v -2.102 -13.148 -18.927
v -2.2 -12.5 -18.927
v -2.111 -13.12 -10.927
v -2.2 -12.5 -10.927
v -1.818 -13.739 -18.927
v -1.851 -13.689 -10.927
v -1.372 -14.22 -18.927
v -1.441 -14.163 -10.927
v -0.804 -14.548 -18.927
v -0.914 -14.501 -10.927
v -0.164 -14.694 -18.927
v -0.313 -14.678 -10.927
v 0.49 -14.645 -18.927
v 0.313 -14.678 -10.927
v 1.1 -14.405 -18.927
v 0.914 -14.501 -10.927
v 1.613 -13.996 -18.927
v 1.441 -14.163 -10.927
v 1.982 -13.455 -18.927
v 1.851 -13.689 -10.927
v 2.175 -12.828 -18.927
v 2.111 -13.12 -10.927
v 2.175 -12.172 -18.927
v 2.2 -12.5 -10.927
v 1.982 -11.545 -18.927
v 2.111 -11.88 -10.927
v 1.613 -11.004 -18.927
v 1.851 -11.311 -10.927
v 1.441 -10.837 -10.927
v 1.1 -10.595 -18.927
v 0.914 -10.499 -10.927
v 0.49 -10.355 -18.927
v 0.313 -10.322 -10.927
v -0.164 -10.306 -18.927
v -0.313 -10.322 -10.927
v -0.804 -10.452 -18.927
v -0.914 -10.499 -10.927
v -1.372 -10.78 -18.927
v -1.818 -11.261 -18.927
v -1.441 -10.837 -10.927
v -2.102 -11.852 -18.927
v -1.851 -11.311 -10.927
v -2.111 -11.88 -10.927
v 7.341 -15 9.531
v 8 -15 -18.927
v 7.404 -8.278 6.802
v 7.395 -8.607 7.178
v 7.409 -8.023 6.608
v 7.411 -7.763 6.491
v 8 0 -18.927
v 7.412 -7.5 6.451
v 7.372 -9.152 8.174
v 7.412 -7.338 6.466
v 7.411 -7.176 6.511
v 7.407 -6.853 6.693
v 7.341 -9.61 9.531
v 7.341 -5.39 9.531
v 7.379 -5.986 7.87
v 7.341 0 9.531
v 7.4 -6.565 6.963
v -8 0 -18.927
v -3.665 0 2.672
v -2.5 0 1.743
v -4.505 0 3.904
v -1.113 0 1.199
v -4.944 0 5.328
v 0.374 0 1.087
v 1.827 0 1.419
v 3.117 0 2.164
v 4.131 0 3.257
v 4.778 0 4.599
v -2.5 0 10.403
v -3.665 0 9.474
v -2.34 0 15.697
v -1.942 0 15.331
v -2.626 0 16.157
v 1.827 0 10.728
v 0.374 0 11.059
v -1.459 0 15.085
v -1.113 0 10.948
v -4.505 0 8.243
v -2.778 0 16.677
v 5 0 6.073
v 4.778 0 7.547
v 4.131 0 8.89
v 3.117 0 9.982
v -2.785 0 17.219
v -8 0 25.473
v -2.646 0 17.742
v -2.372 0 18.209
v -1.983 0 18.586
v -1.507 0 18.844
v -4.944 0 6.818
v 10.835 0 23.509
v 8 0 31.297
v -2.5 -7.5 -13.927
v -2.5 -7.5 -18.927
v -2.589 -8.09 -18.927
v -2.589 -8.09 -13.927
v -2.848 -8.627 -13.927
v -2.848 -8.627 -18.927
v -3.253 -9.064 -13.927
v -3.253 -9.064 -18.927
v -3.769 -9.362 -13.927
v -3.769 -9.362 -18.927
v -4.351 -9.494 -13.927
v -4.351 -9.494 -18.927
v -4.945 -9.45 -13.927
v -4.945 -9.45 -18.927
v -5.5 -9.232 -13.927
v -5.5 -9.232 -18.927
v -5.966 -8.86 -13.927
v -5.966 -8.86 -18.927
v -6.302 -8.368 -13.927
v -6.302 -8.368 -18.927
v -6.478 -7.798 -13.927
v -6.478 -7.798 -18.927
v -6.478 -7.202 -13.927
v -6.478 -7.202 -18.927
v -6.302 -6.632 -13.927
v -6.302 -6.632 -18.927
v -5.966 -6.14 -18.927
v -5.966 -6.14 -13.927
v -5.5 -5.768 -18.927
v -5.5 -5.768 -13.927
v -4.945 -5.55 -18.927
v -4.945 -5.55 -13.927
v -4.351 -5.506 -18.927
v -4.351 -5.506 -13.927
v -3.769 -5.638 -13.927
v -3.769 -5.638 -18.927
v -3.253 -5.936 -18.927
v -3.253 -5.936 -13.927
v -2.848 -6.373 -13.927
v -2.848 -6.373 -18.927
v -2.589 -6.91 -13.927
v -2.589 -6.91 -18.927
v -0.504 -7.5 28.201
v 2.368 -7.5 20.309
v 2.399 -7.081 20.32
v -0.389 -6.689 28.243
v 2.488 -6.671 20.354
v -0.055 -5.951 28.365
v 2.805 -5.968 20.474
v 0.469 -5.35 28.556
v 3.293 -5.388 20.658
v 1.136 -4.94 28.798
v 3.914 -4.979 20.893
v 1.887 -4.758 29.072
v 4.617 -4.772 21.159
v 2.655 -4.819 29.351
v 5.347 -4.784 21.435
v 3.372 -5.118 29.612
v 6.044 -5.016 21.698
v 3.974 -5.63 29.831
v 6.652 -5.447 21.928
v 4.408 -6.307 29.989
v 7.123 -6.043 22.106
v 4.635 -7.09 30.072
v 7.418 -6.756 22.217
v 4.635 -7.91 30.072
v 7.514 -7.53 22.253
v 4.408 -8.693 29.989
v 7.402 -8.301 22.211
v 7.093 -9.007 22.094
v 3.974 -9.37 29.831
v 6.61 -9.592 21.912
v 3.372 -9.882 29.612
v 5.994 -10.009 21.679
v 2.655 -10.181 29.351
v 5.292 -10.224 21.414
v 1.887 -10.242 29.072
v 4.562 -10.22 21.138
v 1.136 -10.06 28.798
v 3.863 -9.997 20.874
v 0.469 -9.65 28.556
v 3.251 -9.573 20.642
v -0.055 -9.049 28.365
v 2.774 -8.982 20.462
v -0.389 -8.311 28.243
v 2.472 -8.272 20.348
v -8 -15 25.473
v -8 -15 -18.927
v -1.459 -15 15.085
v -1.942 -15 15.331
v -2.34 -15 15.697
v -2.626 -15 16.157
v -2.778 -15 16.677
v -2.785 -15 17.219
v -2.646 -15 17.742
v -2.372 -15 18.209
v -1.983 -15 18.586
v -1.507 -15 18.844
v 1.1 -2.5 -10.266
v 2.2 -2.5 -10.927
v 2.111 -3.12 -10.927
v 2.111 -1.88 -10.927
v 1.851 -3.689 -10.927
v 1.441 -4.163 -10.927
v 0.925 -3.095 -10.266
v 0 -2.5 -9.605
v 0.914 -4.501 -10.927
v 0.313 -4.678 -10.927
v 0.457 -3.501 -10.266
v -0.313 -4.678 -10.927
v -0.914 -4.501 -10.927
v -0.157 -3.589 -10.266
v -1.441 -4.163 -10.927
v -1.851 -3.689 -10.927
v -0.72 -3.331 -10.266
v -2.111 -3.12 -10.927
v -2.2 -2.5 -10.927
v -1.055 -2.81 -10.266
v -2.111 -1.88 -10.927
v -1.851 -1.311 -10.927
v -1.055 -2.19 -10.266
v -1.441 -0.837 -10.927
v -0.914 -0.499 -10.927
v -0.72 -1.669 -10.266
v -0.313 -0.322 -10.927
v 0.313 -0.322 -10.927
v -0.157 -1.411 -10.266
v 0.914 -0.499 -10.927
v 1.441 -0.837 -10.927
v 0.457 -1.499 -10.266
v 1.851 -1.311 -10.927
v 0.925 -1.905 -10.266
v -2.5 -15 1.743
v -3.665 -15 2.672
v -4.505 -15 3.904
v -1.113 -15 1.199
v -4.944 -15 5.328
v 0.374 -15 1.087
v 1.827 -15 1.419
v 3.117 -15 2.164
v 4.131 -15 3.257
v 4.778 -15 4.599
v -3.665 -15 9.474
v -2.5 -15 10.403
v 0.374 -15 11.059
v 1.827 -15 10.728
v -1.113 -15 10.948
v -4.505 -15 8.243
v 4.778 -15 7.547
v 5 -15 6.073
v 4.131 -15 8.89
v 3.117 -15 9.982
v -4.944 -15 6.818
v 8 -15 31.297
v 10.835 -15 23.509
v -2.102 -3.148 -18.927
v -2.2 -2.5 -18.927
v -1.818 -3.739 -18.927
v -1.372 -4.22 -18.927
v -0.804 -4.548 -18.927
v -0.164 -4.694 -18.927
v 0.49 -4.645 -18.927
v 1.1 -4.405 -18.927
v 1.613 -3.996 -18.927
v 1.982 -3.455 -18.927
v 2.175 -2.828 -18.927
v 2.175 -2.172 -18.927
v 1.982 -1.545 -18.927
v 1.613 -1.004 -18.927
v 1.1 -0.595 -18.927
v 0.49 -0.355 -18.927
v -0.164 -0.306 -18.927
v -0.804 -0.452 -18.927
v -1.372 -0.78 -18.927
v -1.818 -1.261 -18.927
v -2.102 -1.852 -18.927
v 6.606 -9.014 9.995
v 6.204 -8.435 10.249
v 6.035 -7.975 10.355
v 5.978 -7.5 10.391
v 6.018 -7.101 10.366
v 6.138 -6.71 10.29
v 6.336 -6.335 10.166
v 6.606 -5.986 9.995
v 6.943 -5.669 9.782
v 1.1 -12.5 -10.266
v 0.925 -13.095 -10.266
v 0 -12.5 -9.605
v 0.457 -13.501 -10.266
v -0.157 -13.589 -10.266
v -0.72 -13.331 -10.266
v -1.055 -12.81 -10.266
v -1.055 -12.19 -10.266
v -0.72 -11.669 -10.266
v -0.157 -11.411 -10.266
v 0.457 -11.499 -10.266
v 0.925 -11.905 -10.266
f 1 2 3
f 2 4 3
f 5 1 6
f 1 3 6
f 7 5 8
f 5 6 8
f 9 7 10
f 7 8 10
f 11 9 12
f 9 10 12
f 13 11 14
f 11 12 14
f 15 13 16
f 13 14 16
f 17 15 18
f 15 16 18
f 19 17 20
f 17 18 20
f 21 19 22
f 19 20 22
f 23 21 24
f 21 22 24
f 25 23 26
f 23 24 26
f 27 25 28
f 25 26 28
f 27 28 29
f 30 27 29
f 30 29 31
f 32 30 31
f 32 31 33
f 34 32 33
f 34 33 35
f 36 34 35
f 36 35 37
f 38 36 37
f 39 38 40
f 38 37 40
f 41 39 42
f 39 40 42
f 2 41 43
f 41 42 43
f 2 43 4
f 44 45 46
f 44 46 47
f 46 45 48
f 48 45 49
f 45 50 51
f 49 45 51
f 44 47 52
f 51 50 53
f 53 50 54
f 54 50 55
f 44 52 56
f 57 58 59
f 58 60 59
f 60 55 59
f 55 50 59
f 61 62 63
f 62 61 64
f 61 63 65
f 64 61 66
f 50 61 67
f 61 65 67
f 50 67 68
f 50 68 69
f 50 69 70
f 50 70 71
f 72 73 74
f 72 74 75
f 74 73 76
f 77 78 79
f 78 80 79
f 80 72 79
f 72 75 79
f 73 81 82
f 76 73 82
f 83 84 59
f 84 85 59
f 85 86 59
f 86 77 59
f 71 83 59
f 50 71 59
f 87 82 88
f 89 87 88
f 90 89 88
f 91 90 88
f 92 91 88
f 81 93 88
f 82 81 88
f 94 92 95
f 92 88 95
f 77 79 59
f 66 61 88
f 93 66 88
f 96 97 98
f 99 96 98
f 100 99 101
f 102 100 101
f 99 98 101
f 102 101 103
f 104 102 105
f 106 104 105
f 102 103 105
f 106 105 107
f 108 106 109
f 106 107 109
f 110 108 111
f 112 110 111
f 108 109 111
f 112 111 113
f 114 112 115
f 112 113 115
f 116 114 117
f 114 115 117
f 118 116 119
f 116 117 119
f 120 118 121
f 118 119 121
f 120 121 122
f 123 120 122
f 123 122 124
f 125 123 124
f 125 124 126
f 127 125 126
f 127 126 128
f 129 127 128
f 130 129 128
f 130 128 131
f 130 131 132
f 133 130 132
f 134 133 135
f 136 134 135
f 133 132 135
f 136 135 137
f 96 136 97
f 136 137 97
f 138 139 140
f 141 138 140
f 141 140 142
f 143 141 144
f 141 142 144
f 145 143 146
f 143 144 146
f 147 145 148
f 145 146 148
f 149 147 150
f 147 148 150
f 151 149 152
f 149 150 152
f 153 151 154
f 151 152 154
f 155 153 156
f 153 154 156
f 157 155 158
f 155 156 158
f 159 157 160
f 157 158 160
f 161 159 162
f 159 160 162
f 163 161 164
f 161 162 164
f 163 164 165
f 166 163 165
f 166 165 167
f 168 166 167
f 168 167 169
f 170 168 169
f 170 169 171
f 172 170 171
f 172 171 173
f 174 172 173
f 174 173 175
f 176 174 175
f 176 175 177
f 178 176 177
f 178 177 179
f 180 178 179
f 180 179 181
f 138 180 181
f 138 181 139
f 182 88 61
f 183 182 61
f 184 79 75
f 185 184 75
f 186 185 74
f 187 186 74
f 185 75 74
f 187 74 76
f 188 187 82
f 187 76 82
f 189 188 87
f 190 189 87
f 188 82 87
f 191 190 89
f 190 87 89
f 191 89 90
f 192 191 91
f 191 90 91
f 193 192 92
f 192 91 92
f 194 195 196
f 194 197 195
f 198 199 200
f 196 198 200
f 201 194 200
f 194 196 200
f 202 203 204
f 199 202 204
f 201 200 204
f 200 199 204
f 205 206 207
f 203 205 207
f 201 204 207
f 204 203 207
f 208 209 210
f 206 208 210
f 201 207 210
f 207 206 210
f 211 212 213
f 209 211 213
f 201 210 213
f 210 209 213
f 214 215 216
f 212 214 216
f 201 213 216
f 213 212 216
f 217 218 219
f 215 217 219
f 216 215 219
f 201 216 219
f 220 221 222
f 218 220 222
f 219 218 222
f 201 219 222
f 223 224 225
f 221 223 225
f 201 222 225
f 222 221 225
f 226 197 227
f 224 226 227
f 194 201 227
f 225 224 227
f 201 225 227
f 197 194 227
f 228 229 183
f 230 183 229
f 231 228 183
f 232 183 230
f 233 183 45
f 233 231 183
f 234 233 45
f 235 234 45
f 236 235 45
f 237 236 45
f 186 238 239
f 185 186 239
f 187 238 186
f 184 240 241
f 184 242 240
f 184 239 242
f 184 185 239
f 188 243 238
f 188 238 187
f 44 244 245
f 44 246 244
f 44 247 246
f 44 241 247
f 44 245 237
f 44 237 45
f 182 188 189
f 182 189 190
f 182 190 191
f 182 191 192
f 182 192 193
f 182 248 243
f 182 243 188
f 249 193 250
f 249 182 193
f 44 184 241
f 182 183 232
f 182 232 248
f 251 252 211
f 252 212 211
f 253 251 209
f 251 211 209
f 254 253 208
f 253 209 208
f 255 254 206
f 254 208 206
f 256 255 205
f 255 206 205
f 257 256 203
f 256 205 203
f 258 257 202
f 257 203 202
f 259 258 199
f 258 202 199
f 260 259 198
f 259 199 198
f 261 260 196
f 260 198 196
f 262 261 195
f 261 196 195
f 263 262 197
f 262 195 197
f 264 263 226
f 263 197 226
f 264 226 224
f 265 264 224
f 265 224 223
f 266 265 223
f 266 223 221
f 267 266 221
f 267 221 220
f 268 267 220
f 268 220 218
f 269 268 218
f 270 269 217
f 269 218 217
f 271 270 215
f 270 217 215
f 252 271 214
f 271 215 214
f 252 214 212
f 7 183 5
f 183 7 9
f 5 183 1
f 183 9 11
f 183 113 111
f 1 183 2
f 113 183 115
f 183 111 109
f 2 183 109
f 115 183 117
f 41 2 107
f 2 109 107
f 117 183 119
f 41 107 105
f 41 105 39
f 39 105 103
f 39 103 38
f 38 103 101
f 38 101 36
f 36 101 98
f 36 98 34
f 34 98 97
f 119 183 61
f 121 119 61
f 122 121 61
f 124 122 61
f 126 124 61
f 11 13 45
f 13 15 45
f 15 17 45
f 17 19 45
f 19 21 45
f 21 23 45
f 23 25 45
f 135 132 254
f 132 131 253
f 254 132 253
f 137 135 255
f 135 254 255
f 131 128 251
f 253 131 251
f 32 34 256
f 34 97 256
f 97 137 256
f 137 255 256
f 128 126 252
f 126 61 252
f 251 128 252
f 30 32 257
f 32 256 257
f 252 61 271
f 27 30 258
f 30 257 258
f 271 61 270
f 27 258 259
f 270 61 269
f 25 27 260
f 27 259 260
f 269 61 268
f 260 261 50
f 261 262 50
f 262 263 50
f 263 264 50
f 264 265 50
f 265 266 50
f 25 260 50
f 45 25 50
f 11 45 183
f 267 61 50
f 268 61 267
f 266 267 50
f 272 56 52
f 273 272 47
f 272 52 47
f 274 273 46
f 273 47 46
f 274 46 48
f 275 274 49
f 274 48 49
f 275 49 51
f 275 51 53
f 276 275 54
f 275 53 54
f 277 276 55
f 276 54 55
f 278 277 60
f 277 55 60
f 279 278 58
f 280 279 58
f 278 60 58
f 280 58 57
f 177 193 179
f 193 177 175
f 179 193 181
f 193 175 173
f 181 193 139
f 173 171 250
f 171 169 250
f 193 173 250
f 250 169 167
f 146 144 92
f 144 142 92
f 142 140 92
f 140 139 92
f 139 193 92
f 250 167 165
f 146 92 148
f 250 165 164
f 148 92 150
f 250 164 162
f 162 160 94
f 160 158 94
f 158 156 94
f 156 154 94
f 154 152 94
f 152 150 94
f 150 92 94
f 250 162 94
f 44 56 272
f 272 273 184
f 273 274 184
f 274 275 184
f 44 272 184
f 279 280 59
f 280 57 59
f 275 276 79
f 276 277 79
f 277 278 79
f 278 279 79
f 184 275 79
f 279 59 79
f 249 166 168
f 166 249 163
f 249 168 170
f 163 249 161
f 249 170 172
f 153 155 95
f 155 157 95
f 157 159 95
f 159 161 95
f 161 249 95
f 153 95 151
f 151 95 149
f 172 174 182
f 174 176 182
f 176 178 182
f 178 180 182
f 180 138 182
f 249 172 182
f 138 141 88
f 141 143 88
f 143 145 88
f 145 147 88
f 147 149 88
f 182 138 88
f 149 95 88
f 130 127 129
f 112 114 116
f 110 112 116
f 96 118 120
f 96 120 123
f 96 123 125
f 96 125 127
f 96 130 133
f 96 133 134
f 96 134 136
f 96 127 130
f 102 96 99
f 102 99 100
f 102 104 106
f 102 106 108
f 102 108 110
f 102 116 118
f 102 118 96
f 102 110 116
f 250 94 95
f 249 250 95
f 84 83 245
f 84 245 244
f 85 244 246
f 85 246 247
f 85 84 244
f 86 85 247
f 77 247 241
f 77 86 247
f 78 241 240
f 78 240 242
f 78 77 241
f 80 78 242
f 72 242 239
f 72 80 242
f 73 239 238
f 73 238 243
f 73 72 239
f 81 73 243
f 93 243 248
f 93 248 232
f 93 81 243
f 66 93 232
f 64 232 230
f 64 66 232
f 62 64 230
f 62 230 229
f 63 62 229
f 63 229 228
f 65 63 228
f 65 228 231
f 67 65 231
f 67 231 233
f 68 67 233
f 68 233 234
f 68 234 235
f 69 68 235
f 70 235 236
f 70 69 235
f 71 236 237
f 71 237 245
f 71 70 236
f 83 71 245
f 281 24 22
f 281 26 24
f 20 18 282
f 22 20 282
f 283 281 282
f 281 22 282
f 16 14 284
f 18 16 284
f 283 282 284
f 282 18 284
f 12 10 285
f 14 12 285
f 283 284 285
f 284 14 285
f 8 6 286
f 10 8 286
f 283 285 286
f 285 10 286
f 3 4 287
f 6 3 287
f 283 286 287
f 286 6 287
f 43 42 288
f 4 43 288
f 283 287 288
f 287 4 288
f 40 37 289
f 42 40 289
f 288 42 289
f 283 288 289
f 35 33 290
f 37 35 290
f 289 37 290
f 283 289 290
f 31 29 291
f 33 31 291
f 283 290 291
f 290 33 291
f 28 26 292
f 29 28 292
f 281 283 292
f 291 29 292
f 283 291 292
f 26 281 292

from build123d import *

# Parameters (mm, degrees)
F0_R     = 5
F1_DEPTH = 15
F3_D     = 5.5
F3_DEPTH = 50
F3_TIP   = 1.6523667023
F5_D     = 4.4
F5_DEPTH = 8
F5_TIP   = 1.3218933619
F6_R     = 2
F7_DEPTH = 5


with BuildPart() as f1:
    # F0 (on Front) → F1 (new body)
    with BuildSketch(Plane.XZ):
        with BuildLine():
            Line((-8, -18.9268288441), (8, -18.9268288441))
            Line((8, -18.9268288441), (7.3407884225, 9.531441468))
            Line((7.3407884225, 9.531441468), (-1.4592115775, 15.0849338573))
            ThreePointArc((-1.4592115775, 15.0849338573), (-2.7998378703, 16.9477056406), (-1.5070788684, 18.8440103991))
            Line((-1.5070788684, 18.8440103991), (10.8346573695, 23.5085377897))
            Line((10.8346573695, 23.5085377897), (8, 31.2966949042))
            Line((8, 31.2966949042), (-8, 25.4731711559))
            Line((-8, 25.4731711559), (-8, -18.9268288441))
        make_face()
        with Locations((0, 6.0731711559)):
            Circle(F0_R, mode=Mode.SUBTRACT)
    extrude(amount=F1_DEPTH)

    # F3
    with Locations(Plane(origin=(-9.1227416268, 0, 25.064526623), x_dir=(0.9396926208, 0, 0.3420201433), z_dir=(-0.3420201433, 0, 0.9396926208))):
        with Locations((11.921641043, -7.5)):
            Hole(F3_D / 2, depth=F3_DEPTH)
            with Locations((0, 0, -(F3_DEPTH + F3_TIP / 2))):  # 118° drill point
                Cone(0, F3_D / 2, F3_TIP, mode=Mode.SUBTRACT)

    # F5
    with Locations(Plane(origin=(0, 0, -18.9268288441), x_dir=(1, 0, 0), z_dir=(0, 0, -1))):
        with Locations((0, 12.5), (0, 2.5)):
            Hole(F5_D / 2, depth=F5_DEPTH)
            with Locations((0, 0, -(F5_DEPTH + F5_TIP / 2))):  # 118° drill point
                Cone(0, F5_D / 2, F5_TIP, mode=Mode.SUBTRACT)

    # F6 (on face) → F7 (cut)
    with BuildSketch(Plane(origin=(0, 0, -18.9268288441), x_dir=(1, 0, 0), z_dir=(0, 0, -1))):
        with Locations((-4.5, 7.5)):
            Circle(F6_R)
    extrude(amount=-F7_DEPTH, mode=Mode.SUBTRACT)


solid = f1.part
